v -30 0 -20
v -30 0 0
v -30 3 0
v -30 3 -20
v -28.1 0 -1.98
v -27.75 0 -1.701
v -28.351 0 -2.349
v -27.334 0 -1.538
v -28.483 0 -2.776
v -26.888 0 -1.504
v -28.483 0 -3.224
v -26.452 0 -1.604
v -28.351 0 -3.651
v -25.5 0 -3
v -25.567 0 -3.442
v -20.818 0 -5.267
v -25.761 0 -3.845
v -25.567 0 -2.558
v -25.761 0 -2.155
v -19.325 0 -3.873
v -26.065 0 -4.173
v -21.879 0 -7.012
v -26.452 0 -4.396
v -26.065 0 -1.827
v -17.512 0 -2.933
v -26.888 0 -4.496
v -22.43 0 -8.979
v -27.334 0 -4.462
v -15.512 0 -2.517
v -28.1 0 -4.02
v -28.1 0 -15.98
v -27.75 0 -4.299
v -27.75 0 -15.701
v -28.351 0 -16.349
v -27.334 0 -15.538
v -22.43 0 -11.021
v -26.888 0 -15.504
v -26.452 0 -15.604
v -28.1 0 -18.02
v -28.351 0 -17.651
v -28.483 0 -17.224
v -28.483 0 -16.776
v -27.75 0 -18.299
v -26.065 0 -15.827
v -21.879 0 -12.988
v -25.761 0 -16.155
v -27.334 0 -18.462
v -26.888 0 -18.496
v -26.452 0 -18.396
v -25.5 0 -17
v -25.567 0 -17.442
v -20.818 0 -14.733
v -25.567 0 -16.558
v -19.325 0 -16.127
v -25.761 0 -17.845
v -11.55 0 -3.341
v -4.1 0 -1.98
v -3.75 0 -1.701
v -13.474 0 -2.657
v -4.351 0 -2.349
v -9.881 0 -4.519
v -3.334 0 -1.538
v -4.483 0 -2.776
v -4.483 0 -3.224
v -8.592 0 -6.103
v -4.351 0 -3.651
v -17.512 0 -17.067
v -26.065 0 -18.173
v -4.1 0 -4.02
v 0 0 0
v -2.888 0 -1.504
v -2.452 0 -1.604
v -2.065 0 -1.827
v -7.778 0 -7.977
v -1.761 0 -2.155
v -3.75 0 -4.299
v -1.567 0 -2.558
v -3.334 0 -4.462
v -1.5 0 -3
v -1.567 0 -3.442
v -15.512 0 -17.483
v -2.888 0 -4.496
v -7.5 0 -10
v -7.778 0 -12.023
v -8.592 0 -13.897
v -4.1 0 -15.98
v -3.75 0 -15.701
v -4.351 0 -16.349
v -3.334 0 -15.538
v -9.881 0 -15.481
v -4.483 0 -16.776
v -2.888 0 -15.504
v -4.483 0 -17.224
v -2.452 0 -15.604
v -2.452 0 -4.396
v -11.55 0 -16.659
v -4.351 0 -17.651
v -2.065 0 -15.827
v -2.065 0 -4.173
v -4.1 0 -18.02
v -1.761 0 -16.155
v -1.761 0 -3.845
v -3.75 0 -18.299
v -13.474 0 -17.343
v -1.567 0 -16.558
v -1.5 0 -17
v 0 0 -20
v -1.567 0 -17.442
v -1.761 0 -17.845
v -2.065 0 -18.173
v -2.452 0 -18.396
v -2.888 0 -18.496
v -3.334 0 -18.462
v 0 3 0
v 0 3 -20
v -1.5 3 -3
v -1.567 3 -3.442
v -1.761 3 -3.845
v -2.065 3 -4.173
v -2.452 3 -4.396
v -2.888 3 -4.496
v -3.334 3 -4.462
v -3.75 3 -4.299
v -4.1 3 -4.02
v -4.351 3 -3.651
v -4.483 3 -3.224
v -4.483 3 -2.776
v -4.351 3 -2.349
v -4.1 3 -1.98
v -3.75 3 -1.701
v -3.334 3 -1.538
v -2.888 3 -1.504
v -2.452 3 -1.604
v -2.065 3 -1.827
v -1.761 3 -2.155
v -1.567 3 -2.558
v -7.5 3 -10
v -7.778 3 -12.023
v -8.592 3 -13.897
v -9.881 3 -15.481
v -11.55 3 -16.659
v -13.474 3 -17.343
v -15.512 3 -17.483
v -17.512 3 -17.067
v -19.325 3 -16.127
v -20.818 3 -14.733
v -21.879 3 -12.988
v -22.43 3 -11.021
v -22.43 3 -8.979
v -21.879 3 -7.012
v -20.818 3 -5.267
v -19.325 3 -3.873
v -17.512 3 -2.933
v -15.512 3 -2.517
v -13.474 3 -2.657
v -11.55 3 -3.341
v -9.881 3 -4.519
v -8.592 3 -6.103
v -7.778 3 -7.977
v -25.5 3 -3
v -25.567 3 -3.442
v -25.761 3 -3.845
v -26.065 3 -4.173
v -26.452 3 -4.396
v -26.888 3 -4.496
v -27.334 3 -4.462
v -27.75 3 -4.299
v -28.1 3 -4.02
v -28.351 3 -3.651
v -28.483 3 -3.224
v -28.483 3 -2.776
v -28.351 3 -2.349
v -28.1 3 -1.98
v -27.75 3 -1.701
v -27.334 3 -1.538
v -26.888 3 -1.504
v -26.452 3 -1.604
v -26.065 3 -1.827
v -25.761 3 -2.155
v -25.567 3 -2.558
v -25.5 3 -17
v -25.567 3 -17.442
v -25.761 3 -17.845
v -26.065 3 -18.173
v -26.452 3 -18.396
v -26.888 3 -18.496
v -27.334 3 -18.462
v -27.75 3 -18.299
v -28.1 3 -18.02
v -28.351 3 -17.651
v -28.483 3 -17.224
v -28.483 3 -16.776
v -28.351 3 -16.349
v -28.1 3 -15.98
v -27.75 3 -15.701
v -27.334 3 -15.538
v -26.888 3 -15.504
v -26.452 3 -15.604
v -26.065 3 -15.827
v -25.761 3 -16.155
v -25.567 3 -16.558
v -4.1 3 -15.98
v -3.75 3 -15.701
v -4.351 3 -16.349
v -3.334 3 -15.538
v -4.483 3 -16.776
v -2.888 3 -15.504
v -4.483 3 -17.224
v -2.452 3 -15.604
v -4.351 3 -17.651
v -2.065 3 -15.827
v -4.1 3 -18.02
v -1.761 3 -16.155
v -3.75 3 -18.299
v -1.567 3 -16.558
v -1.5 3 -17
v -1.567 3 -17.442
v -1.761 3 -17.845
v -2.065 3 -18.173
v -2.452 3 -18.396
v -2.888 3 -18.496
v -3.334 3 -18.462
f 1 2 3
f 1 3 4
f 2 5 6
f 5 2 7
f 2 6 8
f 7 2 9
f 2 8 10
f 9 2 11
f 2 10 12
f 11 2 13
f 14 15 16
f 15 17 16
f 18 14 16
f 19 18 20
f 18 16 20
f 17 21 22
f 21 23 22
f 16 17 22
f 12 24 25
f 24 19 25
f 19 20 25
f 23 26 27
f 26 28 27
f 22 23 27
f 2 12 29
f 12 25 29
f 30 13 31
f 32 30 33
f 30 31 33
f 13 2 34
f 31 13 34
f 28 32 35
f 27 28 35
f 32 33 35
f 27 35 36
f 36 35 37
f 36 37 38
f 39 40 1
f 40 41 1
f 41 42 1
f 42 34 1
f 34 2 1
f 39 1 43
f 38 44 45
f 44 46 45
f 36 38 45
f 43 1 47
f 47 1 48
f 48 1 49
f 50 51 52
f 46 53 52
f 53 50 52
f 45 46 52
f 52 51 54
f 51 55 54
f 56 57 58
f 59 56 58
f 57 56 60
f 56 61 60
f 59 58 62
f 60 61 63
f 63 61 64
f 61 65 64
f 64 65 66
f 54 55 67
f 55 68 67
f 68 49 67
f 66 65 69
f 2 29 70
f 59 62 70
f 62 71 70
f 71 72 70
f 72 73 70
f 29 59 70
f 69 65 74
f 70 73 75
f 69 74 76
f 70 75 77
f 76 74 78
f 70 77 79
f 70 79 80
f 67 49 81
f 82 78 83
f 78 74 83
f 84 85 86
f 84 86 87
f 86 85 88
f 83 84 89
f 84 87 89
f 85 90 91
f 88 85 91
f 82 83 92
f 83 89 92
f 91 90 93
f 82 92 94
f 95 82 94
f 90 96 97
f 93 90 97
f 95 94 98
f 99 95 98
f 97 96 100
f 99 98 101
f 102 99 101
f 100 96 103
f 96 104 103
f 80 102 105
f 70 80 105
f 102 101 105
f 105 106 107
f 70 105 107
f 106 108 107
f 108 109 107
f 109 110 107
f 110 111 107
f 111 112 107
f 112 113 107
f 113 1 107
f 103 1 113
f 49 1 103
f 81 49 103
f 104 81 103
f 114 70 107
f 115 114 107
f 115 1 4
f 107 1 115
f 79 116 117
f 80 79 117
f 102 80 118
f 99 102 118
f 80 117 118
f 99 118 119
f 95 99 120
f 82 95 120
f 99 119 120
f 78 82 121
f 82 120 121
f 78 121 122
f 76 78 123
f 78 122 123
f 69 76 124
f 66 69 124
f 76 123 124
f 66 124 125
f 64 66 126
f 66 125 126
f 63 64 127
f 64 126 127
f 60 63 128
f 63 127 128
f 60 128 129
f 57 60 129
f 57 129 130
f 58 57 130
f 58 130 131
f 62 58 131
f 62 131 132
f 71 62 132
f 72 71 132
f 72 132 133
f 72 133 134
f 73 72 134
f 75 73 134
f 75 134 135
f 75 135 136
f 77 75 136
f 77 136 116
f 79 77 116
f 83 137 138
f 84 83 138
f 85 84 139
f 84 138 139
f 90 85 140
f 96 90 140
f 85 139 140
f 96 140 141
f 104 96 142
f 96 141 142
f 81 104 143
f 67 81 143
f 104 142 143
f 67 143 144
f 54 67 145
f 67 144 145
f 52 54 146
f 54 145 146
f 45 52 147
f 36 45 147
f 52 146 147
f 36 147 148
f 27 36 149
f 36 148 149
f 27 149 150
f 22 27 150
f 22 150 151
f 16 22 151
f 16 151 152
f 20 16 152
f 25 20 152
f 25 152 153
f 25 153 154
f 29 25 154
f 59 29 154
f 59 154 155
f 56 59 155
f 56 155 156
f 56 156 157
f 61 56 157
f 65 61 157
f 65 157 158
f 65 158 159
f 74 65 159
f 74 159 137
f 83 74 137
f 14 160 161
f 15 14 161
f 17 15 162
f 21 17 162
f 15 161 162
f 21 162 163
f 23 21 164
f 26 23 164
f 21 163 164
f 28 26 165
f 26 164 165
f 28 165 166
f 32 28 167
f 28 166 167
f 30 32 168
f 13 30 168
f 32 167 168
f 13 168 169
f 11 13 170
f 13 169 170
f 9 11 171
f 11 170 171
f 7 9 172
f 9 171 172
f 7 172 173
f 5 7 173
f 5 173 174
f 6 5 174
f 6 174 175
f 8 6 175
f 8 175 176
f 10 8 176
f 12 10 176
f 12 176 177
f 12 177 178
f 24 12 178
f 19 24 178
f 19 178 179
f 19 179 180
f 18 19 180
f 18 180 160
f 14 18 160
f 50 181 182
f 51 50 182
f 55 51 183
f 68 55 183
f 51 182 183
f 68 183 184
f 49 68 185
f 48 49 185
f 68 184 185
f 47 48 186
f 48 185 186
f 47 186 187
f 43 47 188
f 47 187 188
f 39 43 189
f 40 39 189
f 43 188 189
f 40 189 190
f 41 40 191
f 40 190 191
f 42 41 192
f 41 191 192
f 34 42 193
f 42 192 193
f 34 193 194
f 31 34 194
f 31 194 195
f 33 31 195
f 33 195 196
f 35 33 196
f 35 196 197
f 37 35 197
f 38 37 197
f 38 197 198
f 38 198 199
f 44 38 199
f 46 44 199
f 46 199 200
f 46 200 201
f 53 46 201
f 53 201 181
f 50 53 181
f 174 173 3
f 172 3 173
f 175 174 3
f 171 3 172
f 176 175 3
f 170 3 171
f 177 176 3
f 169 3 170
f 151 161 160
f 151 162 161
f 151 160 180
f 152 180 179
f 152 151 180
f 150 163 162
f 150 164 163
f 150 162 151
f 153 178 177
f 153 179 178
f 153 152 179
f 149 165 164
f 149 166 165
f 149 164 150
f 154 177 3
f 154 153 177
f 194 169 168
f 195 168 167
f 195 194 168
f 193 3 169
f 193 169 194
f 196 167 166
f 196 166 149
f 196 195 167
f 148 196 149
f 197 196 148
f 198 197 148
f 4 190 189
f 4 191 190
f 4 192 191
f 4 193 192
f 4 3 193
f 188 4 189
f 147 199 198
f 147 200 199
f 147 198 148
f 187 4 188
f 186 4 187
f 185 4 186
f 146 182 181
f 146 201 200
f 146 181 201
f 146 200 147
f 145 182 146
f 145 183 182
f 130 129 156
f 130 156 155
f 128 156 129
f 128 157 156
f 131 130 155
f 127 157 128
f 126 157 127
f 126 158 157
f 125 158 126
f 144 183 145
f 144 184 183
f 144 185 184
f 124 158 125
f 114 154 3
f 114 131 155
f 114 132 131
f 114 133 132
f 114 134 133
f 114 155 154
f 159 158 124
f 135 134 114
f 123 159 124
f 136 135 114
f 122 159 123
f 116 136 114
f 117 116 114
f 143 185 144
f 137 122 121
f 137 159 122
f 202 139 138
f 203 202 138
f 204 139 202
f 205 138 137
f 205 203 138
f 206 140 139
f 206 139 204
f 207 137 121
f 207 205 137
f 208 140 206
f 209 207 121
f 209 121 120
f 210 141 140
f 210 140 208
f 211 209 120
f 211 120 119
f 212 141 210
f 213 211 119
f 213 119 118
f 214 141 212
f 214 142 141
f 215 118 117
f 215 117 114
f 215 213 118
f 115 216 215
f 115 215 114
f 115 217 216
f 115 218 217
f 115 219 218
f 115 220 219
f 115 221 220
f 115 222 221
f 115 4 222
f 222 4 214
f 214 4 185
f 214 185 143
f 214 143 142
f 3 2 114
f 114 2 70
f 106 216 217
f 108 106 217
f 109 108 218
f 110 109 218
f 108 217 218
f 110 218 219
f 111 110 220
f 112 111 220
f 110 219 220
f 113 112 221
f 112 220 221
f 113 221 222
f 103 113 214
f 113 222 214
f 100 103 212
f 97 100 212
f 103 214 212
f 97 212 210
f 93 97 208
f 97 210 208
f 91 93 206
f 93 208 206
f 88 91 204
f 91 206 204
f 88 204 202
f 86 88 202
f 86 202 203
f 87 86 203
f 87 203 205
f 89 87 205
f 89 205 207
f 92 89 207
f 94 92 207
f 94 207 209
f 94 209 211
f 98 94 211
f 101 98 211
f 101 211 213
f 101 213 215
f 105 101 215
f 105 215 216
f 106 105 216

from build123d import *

# Parameters (mm, degrees)
SKETCH1_W               = 30
SKETCH1_H               = 20
BOSS_EXTRUDE1_DEPTH     = 3
SKETCH2_R               = 1.5
SKETCH2_R_2             = 7.5
CUT_EXTRUDE1_DEPTH      = 3
CUT_EXTRUDE1_DEPTH_BACK = 23


with BuildPart() as part:
    # Sketch1 → Boss-Extrude1 (new body)
    with BuildSketch(Plane(origin=(0, 0, 0), x_dir=(1, 0, 0), z_dir=(0, 1, 0))):
        with Locations((-15, 10)):
            Rectangle(SKETCH1_W, SKETCH1_H)
    extrude(amount=BOSS_EXTRUDE1_DEPTH)

    # Sketch2 → Cut-Extrude1 (cut, two sides)
    with BuildSketch(Plane(origin=(0, 3, 0), x_dir=(1, 0, 0), z_dir=(0, 1, 0))) as cut_extrude1_sk:
        with Locations((-27, 17)):
            Circle(SKETCH2_R)
        with Locations((-27, 3)):
            Circle(SKETCH2_R)
        with Locations((-3, 3)):
            Circle(SKETCH2_R)
        with Locations((-3, 17)):
            Circle(SKETCH2_R)
        with Locations((-15, 10)):
            Circle(SKETCH2_R_2)
    extrude(amount=CUT_EXTRUDE1_DEPTH, mode=Mode.SUBTRACT)
    extrude(cut_extrude1_sk.sketch, amount=-CUT_EXTRUDE1_DEPTH_BACK, mode=Mode.SUBTRACT)


solid = part.part
